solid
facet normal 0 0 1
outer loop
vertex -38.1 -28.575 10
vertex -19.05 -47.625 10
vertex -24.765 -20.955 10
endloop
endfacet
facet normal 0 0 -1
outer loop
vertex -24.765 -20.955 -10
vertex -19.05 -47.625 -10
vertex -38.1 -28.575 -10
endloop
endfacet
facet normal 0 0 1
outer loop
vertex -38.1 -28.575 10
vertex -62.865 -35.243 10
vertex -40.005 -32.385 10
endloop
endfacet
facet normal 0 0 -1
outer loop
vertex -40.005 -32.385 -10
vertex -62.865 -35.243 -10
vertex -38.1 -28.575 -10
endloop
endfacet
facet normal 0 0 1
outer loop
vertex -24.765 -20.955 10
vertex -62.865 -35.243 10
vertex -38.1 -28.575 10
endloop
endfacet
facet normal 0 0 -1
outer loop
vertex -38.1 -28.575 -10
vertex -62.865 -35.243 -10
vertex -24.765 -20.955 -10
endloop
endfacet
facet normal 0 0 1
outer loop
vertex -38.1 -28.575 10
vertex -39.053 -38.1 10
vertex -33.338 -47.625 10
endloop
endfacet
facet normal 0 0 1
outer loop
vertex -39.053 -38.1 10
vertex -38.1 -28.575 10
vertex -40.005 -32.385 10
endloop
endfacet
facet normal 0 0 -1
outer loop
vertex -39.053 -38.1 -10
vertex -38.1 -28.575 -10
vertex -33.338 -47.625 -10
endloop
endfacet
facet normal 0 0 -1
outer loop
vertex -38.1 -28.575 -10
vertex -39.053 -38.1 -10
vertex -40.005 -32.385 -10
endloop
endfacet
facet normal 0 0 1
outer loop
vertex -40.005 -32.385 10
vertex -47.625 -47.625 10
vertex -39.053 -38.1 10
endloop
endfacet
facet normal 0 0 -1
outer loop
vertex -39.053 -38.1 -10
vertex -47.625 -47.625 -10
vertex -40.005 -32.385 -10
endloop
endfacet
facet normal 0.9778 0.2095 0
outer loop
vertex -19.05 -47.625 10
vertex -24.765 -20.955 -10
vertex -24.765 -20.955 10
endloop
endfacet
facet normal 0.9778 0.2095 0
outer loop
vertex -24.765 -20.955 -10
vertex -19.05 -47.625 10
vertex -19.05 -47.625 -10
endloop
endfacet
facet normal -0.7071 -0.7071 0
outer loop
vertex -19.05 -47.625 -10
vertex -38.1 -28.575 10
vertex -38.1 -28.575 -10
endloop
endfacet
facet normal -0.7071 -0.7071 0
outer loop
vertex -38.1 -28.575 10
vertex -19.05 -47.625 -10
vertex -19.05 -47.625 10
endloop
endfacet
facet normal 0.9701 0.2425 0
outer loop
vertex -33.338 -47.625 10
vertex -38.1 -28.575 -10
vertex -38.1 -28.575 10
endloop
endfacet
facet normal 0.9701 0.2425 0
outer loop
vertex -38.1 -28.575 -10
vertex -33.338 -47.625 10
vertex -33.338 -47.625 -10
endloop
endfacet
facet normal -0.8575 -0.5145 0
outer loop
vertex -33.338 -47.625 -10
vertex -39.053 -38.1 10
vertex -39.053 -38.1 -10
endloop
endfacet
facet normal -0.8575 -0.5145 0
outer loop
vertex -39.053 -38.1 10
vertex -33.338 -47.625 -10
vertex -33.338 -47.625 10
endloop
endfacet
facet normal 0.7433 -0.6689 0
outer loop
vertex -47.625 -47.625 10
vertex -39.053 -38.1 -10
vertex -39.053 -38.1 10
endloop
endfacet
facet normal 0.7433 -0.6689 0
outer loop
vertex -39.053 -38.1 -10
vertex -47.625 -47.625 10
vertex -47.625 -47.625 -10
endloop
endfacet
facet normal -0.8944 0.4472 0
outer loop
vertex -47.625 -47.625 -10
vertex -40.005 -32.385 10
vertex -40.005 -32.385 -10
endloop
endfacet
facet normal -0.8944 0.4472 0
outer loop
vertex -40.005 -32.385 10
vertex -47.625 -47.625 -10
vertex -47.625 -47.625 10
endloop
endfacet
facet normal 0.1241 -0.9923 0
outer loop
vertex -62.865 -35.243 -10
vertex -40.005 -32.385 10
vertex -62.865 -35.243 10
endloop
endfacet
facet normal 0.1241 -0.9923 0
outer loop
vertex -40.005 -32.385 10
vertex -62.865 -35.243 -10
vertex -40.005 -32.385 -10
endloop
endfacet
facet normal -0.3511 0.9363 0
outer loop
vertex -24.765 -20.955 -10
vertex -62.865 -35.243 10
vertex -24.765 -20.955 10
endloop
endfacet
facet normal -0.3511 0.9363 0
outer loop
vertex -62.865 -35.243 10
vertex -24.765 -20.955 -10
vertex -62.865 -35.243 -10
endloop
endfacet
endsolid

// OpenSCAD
polyhedron(
    points=[
    [-24.765, -20.955, 10],
    [-19.05, -47.625, 10],
    [-38.1, -28.575, 10],
    [-33.3375, -47.625, 10],
    [-39.0525, -38.1, 10],
    [-47.625, -47.625, 10],
    [-40.005, -32.385, 10],
    [-62.865, -35.2425, 10],
    [-24.765, -20.955, -10],
    [-19.05, -47.625, -10],
    [-38.1, -28.575, -10],
    [-33.3375, -47.625, -10],
    [-39.0525, -38.1, -10],
    [-47.625, -47.625, -10],
    [-40.005, -32.385, -10],
    [-62.865, -35.2425, -10],
    ],
    faces=[
        [0,1,2],
        [10,9,8],
        [6,7,2],
        [10,15,14],
        [2,7,0],
        [8,15,10],
        [2,3,4,6],
        [14,12,11,10],
        [4,5,6],
        [14,13,12],
        [0,8,9,1],
        [1,9,10,2],
        [2,10,11,3],
        [3,11,12,4],
        [4,12,13,5],
        [5,13,14,6],
        [6,14,15,7],
        [7,15,8,0],
    ]
);
